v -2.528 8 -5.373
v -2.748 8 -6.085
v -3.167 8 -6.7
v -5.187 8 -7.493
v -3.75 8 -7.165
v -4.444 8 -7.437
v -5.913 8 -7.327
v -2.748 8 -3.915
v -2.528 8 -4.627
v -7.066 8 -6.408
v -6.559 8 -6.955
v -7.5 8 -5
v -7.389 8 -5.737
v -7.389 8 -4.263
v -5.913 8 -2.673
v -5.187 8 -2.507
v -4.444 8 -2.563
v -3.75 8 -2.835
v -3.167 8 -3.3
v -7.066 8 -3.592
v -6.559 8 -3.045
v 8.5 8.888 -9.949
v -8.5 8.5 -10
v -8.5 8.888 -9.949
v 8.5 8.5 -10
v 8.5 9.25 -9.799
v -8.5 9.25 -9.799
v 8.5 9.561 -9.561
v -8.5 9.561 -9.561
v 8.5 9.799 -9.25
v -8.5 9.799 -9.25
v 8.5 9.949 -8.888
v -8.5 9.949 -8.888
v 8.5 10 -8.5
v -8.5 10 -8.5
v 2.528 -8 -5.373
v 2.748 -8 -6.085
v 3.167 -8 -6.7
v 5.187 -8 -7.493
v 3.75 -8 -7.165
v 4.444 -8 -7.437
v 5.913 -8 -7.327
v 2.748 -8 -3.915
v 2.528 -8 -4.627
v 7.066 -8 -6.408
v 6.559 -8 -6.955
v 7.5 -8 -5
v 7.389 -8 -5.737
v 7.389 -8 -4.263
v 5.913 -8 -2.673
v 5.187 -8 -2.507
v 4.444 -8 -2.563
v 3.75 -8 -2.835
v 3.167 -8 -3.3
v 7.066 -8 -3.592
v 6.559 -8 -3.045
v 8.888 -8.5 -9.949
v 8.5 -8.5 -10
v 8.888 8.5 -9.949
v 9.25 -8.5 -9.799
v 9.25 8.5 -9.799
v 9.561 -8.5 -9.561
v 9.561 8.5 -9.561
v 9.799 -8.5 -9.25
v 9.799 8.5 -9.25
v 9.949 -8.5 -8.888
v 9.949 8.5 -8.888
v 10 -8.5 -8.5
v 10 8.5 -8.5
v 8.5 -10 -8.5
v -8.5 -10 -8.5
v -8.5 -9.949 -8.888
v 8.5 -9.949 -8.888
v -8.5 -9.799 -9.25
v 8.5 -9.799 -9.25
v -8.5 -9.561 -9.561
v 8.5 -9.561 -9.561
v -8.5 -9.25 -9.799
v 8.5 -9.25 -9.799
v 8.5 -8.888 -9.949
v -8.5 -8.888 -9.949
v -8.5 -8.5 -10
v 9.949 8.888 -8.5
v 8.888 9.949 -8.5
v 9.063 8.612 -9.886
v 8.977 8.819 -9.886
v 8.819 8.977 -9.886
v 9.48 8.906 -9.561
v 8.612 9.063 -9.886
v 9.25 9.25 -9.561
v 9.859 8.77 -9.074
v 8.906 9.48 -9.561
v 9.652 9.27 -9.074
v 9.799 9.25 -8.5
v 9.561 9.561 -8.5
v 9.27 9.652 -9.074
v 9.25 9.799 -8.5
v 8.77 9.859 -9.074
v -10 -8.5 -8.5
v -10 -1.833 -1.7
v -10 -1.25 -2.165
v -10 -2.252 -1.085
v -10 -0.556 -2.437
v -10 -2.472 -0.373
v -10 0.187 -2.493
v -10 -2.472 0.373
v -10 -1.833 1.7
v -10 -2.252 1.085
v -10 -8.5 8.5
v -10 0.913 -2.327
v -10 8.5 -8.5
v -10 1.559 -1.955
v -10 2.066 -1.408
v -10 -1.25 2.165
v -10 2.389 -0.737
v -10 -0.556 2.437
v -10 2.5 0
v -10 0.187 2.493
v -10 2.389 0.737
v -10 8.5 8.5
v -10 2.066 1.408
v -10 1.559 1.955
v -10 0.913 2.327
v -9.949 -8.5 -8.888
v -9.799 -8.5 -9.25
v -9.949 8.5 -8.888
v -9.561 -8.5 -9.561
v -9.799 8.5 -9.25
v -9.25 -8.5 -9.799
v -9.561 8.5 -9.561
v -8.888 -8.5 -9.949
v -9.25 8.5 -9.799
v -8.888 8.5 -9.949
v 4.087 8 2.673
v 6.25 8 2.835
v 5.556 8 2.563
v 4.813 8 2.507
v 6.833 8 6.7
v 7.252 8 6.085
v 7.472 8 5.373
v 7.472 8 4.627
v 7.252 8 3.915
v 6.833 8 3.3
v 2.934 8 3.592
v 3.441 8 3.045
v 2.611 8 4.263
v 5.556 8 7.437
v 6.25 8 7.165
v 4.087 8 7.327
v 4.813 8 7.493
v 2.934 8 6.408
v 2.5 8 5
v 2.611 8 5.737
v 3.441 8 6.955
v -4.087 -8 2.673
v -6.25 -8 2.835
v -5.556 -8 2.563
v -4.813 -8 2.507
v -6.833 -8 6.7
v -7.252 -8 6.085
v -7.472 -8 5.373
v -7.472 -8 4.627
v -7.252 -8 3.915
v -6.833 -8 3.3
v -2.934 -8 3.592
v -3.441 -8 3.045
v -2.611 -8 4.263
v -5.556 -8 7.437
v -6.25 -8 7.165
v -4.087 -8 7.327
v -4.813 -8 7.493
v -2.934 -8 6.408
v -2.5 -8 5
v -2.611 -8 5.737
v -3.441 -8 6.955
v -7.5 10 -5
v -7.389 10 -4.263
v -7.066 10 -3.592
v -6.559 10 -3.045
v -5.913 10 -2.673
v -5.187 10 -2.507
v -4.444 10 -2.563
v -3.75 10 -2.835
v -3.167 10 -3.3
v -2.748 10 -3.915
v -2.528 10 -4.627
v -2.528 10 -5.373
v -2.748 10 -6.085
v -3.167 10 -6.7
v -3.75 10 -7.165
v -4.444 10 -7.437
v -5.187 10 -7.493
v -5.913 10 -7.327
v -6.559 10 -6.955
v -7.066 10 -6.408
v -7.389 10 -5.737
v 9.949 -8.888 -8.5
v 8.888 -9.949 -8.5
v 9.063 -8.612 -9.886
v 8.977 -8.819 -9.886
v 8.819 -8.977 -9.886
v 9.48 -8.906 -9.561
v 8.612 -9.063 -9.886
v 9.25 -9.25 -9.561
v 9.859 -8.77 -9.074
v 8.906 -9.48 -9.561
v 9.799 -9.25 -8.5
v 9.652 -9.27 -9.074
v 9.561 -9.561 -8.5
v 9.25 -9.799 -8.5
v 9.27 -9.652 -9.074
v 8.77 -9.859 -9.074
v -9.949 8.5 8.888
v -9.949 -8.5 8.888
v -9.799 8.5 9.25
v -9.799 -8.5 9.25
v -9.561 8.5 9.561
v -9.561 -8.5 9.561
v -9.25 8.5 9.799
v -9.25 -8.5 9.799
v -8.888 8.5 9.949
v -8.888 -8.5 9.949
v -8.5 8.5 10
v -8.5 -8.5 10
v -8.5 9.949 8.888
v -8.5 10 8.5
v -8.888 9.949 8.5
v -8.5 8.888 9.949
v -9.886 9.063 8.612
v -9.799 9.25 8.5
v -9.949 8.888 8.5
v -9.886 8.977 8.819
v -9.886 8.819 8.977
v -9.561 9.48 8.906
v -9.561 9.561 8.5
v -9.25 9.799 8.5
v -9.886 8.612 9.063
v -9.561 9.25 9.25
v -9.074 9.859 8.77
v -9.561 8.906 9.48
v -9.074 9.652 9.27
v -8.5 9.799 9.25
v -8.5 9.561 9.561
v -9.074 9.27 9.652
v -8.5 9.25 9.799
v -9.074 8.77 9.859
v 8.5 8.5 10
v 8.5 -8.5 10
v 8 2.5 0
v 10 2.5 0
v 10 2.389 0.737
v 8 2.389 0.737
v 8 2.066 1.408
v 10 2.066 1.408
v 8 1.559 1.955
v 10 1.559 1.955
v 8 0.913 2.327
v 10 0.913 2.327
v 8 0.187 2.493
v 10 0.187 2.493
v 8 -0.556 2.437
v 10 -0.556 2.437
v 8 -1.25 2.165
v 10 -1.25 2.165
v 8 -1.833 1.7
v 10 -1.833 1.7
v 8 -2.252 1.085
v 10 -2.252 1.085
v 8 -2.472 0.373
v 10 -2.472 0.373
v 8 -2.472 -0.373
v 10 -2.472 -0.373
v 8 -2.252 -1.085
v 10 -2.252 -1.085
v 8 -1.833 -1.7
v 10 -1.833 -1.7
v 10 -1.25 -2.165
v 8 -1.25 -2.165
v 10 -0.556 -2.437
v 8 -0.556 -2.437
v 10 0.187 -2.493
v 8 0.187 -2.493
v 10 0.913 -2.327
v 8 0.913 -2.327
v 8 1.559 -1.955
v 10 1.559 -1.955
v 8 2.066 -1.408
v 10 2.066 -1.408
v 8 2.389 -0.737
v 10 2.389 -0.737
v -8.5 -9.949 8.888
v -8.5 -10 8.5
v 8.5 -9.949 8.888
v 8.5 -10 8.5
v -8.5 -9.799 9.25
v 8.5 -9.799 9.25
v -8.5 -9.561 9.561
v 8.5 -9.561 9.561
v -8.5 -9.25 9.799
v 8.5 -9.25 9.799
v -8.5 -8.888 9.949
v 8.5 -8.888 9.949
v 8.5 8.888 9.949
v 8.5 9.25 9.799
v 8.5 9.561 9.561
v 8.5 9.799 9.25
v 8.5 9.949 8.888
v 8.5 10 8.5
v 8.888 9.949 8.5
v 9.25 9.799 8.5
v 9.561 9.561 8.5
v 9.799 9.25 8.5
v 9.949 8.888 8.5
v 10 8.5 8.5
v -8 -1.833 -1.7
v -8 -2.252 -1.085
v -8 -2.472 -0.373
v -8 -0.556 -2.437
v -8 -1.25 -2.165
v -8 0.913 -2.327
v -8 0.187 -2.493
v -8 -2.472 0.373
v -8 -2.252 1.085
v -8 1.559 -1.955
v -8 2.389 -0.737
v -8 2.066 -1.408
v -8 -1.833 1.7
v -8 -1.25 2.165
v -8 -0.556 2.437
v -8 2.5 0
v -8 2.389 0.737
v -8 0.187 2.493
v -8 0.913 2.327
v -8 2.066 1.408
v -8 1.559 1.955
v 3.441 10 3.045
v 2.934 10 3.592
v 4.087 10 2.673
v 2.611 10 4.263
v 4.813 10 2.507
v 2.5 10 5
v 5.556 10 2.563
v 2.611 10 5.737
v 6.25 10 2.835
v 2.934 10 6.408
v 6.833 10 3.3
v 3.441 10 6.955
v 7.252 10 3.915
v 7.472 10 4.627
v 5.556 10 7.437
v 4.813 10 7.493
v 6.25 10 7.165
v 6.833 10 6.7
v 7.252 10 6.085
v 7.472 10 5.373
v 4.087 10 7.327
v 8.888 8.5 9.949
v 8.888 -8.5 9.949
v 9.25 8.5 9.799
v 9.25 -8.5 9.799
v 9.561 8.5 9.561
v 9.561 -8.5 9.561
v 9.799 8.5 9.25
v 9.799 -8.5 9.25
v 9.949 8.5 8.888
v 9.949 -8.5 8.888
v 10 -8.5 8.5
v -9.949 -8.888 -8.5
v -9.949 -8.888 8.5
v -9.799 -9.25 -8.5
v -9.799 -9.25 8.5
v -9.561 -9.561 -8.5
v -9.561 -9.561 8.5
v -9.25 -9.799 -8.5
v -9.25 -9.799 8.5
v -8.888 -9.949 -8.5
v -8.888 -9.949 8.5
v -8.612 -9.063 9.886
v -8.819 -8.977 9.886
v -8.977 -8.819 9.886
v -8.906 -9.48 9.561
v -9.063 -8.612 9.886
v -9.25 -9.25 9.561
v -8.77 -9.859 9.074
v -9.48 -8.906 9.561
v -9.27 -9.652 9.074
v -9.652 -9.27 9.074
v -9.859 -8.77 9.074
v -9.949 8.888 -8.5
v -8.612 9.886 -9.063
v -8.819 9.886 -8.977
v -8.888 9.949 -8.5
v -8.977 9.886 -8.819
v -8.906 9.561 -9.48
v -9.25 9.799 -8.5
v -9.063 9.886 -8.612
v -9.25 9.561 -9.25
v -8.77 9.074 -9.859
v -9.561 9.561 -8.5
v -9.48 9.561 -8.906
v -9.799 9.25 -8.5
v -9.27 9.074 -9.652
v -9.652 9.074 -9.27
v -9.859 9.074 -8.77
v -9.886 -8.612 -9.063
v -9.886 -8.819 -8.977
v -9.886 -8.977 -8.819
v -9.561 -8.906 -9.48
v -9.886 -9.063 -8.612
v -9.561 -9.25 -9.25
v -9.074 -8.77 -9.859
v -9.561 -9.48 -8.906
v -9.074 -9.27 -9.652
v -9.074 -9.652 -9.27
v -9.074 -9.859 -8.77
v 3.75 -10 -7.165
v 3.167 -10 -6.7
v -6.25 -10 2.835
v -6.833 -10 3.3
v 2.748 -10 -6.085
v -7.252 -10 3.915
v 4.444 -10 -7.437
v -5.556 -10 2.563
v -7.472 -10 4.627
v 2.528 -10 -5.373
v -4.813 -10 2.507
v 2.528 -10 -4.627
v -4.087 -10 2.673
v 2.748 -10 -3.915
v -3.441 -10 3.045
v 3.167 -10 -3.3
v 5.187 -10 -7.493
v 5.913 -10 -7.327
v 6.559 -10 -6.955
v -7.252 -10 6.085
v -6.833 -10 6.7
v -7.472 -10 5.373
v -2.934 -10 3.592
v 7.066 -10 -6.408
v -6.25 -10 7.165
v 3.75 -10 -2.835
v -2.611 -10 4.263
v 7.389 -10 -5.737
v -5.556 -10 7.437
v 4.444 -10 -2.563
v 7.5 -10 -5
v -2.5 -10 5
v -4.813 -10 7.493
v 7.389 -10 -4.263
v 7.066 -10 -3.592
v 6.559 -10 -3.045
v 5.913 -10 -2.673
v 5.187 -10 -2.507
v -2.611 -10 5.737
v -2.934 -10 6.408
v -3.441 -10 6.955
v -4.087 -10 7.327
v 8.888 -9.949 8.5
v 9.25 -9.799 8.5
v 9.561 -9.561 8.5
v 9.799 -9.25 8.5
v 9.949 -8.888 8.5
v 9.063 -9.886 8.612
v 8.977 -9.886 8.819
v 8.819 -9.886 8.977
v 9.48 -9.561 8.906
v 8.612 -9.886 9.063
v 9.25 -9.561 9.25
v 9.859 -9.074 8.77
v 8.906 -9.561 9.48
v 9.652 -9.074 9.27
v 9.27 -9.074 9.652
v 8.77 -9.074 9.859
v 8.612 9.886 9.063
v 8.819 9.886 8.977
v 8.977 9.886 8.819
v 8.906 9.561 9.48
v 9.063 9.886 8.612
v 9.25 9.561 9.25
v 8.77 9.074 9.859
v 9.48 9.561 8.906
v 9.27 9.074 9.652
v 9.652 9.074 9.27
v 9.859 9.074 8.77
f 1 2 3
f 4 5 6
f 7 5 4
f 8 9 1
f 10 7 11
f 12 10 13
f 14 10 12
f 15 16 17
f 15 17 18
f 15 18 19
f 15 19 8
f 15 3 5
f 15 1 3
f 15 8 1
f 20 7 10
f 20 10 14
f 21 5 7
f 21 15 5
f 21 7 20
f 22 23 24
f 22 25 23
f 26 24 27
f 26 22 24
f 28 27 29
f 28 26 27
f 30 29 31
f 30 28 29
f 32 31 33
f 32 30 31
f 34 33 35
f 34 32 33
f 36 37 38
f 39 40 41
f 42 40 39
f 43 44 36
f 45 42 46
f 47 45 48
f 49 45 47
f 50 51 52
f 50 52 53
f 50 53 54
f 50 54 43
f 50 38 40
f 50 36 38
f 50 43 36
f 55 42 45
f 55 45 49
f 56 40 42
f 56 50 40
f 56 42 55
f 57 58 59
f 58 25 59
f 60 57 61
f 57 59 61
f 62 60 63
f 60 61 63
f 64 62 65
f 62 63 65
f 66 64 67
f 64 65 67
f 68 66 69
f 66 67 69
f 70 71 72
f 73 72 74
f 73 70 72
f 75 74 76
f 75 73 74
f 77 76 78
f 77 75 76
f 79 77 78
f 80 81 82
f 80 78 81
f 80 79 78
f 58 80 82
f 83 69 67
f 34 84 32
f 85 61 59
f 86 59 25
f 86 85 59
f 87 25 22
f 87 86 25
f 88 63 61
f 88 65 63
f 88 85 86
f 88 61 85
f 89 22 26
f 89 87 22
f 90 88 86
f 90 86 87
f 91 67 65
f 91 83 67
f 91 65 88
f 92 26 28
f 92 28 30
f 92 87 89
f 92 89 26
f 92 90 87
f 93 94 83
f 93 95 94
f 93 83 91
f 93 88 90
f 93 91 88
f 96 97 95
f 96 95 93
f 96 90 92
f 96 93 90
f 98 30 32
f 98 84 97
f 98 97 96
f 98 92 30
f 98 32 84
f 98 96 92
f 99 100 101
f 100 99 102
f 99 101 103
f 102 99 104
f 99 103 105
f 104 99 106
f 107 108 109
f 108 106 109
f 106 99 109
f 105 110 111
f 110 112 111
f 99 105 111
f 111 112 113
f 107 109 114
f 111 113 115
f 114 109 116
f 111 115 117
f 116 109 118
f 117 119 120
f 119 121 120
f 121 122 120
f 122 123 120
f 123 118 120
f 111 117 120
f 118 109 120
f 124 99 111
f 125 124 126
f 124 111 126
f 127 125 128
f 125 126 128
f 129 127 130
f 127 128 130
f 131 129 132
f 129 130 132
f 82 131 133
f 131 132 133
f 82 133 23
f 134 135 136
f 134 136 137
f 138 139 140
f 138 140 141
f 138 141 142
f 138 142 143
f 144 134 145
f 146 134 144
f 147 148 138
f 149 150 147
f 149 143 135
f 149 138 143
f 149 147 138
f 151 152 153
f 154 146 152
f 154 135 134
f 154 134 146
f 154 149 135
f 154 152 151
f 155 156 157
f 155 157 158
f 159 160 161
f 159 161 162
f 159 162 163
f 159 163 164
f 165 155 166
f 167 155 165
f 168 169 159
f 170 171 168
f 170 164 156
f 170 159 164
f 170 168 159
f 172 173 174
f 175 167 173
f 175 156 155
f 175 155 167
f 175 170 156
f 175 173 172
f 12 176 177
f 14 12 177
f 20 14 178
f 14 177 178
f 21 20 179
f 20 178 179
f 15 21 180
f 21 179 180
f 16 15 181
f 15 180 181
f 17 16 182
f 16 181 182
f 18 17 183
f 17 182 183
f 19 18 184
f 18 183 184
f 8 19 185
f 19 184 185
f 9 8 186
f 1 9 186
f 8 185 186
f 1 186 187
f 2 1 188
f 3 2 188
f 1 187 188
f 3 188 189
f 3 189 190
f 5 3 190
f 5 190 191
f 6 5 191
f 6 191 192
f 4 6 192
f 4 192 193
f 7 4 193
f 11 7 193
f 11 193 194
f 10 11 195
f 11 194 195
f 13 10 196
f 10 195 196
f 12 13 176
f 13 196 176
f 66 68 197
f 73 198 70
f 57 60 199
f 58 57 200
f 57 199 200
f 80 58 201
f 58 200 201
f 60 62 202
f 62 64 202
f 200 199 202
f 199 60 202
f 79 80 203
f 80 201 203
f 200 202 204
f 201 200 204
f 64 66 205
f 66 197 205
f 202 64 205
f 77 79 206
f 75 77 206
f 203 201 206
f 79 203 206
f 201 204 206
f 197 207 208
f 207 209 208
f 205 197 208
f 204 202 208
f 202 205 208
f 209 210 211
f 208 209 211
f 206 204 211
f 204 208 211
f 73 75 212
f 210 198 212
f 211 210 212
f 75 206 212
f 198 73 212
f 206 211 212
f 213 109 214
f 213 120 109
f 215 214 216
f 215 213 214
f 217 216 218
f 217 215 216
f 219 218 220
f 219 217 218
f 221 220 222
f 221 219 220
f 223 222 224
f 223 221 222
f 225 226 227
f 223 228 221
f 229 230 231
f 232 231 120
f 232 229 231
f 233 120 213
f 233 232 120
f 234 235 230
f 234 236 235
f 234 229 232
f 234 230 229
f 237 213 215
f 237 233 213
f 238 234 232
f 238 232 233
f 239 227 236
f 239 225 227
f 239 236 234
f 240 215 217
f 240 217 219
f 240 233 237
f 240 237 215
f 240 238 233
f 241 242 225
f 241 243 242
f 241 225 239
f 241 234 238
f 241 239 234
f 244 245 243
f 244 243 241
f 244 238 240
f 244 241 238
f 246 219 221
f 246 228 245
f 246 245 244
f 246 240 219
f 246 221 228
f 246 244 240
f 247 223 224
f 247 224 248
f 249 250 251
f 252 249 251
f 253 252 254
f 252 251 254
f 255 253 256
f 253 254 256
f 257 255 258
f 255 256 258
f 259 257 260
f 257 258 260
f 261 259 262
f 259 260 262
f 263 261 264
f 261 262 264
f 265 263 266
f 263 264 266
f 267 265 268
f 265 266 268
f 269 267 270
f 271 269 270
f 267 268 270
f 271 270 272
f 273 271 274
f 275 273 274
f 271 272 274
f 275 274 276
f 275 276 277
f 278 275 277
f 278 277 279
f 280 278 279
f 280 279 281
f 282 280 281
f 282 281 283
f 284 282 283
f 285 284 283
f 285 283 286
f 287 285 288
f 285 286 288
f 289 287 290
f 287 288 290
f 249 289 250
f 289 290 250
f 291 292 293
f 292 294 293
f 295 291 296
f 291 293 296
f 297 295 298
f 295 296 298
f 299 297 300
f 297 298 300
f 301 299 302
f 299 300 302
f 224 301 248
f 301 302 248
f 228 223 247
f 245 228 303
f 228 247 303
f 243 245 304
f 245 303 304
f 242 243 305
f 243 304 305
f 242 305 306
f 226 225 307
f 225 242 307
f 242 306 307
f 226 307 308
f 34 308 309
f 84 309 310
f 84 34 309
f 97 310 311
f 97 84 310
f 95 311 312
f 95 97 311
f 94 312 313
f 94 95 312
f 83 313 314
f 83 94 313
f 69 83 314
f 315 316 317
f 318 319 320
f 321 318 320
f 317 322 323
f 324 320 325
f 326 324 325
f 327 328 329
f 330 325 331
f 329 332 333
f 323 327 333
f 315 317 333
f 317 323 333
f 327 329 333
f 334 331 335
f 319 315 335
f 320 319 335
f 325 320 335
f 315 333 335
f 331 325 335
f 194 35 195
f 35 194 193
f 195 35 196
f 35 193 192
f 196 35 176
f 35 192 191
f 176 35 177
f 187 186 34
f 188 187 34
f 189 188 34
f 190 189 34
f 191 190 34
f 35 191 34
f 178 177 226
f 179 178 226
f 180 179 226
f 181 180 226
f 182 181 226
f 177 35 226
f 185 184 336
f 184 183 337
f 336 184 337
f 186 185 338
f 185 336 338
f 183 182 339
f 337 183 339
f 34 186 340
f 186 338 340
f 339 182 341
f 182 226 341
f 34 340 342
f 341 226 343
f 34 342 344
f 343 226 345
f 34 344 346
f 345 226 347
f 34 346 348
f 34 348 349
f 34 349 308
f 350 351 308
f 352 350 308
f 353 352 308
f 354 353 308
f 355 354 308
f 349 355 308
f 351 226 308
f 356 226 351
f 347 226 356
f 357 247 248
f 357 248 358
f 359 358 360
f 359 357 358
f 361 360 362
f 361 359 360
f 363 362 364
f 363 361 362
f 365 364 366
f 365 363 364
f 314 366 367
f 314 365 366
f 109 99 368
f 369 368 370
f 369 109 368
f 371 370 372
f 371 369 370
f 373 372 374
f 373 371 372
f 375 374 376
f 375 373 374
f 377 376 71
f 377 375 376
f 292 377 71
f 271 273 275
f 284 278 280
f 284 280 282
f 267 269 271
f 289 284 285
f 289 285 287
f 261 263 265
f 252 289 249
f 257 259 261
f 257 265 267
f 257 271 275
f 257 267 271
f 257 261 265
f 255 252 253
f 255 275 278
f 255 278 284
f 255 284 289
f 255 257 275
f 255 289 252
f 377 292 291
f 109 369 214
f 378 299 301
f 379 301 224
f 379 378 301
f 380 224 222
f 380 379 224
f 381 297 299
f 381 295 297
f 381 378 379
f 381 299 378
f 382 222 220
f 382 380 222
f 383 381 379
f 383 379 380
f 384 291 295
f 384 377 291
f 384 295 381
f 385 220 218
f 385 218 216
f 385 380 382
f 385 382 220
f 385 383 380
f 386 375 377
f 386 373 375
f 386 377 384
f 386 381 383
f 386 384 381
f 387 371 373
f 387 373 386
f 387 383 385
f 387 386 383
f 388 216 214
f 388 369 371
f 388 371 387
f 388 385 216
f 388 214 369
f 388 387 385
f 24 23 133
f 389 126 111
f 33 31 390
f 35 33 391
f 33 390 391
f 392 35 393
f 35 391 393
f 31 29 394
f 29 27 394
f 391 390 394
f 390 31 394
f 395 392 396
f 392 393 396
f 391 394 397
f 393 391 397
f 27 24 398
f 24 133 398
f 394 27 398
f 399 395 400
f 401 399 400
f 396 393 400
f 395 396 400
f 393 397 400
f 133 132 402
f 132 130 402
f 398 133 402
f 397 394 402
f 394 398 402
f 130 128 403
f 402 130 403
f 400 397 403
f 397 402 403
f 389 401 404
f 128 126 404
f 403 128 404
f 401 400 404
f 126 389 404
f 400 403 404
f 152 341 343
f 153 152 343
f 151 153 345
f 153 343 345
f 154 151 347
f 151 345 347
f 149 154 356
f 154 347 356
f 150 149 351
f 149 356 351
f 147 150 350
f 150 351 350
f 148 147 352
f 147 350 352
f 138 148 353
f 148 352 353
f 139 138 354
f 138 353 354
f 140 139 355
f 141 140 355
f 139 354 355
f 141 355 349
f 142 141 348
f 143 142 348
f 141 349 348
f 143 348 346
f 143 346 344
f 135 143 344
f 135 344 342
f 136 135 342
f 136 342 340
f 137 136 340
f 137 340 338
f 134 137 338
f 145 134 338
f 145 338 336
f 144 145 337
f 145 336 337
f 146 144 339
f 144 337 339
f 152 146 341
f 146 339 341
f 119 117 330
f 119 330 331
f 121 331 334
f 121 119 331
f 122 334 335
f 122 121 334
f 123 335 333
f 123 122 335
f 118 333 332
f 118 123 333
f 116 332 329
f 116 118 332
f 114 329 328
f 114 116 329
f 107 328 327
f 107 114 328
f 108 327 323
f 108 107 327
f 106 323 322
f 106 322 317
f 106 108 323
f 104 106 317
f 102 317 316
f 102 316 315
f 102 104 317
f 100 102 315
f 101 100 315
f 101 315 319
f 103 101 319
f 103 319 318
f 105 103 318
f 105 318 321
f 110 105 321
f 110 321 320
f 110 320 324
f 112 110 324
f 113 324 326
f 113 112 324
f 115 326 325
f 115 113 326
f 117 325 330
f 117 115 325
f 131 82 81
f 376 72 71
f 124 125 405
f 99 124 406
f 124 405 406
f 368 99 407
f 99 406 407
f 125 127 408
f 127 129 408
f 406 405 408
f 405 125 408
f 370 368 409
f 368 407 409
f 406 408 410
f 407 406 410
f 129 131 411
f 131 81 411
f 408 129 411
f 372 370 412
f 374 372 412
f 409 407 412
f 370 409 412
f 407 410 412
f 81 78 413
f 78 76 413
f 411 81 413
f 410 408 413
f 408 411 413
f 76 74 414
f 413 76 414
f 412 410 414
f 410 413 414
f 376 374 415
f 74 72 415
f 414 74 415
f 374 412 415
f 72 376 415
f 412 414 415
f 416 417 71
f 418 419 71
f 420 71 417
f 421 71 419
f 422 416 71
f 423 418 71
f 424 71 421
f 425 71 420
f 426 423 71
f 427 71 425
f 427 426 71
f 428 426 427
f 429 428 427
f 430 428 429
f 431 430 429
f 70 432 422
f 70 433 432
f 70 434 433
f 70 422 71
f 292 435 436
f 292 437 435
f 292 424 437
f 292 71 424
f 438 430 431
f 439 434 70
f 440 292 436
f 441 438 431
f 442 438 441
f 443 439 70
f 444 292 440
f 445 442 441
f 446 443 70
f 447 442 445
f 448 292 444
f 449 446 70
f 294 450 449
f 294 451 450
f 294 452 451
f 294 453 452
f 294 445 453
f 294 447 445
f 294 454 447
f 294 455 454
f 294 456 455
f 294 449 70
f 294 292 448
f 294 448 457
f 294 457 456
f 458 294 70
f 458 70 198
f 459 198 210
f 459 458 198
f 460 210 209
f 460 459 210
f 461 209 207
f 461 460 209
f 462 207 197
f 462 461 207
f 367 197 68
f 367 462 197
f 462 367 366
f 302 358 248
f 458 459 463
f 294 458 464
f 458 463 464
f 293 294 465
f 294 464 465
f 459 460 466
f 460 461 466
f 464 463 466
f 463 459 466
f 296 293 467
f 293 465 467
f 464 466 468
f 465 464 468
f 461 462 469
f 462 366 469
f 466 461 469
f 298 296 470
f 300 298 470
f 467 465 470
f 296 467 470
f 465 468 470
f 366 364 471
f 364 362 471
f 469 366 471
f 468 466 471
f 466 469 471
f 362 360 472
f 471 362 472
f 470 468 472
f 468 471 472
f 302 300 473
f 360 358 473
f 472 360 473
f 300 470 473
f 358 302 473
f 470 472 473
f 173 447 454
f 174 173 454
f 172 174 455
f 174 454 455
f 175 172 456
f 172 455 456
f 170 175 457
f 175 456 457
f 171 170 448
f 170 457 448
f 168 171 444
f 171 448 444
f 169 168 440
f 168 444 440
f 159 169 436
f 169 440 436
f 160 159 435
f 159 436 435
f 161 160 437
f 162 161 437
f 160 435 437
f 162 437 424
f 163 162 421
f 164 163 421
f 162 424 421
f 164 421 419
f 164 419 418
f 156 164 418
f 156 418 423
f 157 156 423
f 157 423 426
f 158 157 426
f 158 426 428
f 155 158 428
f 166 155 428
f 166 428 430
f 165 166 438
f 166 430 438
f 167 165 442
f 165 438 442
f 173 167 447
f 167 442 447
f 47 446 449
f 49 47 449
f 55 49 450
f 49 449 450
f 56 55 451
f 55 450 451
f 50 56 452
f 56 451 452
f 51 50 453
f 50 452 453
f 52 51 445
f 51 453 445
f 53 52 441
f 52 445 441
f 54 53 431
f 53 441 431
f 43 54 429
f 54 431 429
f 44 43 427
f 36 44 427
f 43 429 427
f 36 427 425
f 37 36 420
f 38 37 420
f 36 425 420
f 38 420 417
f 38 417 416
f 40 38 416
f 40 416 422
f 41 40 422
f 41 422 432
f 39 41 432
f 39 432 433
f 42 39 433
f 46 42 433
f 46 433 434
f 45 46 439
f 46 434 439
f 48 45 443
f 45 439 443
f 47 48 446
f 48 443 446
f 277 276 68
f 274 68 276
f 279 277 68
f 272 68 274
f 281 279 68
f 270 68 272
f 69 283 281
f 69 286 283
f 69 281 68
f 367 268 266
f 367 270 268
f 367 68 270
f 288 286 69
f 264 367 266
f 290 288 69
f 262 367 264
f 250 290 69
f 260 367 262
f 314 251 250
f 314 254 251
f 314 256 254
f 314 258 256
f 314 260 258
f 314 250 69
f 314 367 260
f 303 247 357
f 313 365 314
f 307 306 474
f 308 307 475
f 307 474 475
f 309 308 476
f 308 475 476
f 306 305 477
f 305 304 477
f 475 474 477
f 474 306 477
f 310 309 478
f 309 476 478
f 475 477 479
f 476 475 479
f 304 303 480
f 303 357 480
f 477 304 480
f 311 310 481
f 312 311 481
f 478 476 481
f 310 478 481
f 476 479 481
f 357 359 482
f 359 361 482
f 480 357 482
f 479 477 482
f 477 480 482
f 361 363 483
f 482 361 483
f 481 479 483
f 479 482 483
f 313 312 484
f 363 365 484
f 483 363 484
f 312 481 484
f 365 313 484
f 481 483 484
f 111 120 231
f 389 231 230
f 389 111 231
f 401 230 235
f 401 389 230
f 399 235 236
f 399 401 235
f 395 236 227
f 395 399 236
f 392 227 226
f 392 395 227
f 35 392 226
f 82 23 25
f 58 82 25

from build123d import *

# Parameters (mm, degrees)
F0_W     = 20
F0_H     = 20
F1_DEPTH = 10
F2_R     = 2.5
F3_DEPTH = 2
F4_R     = 2.5
F5_DEPTH = 2
F6_R     = 2.5
F7_DEPTH = 2
F8_R     = 1.5


# Not quite as in the source:
# - a pattern or mirror of a feature is missing from the dataset's text; its kind, count and spacing are read off the source's solid


with BuildPart() as f1:
    # F0 (on Top) → F1 (new body, symmetric)
    with BuildSketch(Plane.XY):
        Rectangle(F0_W, F0_H)
    extrude(amount=F1_DEPTH, both=True)

    # F2 (on face) → F3 (cut)
    with BuildSketch(Plane.YZ.offset(10)):
        Circle(F2_R)
    f3 = extrude(amount=-F3_DEPTH, mode=Mode.SUBTRACT)

    # F3_copies: F3 across plane
    add(f3.mirror(Plane(origin=(0, 0, 0), x_dir=(0, 0, -1), z_dir=(-1, 0, 0))), mode=Mode.SUBTRACT)

    # F4 (on face) → F5 (cut)
    with BuildSketch(Plane(origin=(0, 10, 0), x_dir=(-1, 0, 0), z_dir=(0, 1, 0))):
        with Locations((5, -5)):
            Circle(F4_R)
        with Locations((-5, 5)):
            Circle(F4_R)
    extrude(amount=-F5_DEPTH, mode=Mode.SUBTRACT)

    # F6 (on face) → F7 (cut)
    with BuildSketch(Plane.XZ.offset(10)):
        with Locations((-5, 5)):
            Circle(F6_R)
        with Locations((5, -5)):
            Circle(F6_R)
    extrude(amount=-F7_DEPTH, mode=Mode.SUBTRACT)

    # F8
    f8_edges = [f1.edges().sort_by_distance(p)[0] for p in [
        (10, 0, 10),
        (0, 10, 10),
        (10, 10, 0),
        (10, -10, 0),
        (10, 0, -10),
        (0, -10, -10),
        (-10, 0, -10),
        (0, 10, -10),
        (-10, 10, 0),
        (-10, -10, 0),
        (0, -10, 10),
        (-10, 0, 10),
    ]]
    fillet(f8_edges, radius=F8_R)


solid = f1.part
